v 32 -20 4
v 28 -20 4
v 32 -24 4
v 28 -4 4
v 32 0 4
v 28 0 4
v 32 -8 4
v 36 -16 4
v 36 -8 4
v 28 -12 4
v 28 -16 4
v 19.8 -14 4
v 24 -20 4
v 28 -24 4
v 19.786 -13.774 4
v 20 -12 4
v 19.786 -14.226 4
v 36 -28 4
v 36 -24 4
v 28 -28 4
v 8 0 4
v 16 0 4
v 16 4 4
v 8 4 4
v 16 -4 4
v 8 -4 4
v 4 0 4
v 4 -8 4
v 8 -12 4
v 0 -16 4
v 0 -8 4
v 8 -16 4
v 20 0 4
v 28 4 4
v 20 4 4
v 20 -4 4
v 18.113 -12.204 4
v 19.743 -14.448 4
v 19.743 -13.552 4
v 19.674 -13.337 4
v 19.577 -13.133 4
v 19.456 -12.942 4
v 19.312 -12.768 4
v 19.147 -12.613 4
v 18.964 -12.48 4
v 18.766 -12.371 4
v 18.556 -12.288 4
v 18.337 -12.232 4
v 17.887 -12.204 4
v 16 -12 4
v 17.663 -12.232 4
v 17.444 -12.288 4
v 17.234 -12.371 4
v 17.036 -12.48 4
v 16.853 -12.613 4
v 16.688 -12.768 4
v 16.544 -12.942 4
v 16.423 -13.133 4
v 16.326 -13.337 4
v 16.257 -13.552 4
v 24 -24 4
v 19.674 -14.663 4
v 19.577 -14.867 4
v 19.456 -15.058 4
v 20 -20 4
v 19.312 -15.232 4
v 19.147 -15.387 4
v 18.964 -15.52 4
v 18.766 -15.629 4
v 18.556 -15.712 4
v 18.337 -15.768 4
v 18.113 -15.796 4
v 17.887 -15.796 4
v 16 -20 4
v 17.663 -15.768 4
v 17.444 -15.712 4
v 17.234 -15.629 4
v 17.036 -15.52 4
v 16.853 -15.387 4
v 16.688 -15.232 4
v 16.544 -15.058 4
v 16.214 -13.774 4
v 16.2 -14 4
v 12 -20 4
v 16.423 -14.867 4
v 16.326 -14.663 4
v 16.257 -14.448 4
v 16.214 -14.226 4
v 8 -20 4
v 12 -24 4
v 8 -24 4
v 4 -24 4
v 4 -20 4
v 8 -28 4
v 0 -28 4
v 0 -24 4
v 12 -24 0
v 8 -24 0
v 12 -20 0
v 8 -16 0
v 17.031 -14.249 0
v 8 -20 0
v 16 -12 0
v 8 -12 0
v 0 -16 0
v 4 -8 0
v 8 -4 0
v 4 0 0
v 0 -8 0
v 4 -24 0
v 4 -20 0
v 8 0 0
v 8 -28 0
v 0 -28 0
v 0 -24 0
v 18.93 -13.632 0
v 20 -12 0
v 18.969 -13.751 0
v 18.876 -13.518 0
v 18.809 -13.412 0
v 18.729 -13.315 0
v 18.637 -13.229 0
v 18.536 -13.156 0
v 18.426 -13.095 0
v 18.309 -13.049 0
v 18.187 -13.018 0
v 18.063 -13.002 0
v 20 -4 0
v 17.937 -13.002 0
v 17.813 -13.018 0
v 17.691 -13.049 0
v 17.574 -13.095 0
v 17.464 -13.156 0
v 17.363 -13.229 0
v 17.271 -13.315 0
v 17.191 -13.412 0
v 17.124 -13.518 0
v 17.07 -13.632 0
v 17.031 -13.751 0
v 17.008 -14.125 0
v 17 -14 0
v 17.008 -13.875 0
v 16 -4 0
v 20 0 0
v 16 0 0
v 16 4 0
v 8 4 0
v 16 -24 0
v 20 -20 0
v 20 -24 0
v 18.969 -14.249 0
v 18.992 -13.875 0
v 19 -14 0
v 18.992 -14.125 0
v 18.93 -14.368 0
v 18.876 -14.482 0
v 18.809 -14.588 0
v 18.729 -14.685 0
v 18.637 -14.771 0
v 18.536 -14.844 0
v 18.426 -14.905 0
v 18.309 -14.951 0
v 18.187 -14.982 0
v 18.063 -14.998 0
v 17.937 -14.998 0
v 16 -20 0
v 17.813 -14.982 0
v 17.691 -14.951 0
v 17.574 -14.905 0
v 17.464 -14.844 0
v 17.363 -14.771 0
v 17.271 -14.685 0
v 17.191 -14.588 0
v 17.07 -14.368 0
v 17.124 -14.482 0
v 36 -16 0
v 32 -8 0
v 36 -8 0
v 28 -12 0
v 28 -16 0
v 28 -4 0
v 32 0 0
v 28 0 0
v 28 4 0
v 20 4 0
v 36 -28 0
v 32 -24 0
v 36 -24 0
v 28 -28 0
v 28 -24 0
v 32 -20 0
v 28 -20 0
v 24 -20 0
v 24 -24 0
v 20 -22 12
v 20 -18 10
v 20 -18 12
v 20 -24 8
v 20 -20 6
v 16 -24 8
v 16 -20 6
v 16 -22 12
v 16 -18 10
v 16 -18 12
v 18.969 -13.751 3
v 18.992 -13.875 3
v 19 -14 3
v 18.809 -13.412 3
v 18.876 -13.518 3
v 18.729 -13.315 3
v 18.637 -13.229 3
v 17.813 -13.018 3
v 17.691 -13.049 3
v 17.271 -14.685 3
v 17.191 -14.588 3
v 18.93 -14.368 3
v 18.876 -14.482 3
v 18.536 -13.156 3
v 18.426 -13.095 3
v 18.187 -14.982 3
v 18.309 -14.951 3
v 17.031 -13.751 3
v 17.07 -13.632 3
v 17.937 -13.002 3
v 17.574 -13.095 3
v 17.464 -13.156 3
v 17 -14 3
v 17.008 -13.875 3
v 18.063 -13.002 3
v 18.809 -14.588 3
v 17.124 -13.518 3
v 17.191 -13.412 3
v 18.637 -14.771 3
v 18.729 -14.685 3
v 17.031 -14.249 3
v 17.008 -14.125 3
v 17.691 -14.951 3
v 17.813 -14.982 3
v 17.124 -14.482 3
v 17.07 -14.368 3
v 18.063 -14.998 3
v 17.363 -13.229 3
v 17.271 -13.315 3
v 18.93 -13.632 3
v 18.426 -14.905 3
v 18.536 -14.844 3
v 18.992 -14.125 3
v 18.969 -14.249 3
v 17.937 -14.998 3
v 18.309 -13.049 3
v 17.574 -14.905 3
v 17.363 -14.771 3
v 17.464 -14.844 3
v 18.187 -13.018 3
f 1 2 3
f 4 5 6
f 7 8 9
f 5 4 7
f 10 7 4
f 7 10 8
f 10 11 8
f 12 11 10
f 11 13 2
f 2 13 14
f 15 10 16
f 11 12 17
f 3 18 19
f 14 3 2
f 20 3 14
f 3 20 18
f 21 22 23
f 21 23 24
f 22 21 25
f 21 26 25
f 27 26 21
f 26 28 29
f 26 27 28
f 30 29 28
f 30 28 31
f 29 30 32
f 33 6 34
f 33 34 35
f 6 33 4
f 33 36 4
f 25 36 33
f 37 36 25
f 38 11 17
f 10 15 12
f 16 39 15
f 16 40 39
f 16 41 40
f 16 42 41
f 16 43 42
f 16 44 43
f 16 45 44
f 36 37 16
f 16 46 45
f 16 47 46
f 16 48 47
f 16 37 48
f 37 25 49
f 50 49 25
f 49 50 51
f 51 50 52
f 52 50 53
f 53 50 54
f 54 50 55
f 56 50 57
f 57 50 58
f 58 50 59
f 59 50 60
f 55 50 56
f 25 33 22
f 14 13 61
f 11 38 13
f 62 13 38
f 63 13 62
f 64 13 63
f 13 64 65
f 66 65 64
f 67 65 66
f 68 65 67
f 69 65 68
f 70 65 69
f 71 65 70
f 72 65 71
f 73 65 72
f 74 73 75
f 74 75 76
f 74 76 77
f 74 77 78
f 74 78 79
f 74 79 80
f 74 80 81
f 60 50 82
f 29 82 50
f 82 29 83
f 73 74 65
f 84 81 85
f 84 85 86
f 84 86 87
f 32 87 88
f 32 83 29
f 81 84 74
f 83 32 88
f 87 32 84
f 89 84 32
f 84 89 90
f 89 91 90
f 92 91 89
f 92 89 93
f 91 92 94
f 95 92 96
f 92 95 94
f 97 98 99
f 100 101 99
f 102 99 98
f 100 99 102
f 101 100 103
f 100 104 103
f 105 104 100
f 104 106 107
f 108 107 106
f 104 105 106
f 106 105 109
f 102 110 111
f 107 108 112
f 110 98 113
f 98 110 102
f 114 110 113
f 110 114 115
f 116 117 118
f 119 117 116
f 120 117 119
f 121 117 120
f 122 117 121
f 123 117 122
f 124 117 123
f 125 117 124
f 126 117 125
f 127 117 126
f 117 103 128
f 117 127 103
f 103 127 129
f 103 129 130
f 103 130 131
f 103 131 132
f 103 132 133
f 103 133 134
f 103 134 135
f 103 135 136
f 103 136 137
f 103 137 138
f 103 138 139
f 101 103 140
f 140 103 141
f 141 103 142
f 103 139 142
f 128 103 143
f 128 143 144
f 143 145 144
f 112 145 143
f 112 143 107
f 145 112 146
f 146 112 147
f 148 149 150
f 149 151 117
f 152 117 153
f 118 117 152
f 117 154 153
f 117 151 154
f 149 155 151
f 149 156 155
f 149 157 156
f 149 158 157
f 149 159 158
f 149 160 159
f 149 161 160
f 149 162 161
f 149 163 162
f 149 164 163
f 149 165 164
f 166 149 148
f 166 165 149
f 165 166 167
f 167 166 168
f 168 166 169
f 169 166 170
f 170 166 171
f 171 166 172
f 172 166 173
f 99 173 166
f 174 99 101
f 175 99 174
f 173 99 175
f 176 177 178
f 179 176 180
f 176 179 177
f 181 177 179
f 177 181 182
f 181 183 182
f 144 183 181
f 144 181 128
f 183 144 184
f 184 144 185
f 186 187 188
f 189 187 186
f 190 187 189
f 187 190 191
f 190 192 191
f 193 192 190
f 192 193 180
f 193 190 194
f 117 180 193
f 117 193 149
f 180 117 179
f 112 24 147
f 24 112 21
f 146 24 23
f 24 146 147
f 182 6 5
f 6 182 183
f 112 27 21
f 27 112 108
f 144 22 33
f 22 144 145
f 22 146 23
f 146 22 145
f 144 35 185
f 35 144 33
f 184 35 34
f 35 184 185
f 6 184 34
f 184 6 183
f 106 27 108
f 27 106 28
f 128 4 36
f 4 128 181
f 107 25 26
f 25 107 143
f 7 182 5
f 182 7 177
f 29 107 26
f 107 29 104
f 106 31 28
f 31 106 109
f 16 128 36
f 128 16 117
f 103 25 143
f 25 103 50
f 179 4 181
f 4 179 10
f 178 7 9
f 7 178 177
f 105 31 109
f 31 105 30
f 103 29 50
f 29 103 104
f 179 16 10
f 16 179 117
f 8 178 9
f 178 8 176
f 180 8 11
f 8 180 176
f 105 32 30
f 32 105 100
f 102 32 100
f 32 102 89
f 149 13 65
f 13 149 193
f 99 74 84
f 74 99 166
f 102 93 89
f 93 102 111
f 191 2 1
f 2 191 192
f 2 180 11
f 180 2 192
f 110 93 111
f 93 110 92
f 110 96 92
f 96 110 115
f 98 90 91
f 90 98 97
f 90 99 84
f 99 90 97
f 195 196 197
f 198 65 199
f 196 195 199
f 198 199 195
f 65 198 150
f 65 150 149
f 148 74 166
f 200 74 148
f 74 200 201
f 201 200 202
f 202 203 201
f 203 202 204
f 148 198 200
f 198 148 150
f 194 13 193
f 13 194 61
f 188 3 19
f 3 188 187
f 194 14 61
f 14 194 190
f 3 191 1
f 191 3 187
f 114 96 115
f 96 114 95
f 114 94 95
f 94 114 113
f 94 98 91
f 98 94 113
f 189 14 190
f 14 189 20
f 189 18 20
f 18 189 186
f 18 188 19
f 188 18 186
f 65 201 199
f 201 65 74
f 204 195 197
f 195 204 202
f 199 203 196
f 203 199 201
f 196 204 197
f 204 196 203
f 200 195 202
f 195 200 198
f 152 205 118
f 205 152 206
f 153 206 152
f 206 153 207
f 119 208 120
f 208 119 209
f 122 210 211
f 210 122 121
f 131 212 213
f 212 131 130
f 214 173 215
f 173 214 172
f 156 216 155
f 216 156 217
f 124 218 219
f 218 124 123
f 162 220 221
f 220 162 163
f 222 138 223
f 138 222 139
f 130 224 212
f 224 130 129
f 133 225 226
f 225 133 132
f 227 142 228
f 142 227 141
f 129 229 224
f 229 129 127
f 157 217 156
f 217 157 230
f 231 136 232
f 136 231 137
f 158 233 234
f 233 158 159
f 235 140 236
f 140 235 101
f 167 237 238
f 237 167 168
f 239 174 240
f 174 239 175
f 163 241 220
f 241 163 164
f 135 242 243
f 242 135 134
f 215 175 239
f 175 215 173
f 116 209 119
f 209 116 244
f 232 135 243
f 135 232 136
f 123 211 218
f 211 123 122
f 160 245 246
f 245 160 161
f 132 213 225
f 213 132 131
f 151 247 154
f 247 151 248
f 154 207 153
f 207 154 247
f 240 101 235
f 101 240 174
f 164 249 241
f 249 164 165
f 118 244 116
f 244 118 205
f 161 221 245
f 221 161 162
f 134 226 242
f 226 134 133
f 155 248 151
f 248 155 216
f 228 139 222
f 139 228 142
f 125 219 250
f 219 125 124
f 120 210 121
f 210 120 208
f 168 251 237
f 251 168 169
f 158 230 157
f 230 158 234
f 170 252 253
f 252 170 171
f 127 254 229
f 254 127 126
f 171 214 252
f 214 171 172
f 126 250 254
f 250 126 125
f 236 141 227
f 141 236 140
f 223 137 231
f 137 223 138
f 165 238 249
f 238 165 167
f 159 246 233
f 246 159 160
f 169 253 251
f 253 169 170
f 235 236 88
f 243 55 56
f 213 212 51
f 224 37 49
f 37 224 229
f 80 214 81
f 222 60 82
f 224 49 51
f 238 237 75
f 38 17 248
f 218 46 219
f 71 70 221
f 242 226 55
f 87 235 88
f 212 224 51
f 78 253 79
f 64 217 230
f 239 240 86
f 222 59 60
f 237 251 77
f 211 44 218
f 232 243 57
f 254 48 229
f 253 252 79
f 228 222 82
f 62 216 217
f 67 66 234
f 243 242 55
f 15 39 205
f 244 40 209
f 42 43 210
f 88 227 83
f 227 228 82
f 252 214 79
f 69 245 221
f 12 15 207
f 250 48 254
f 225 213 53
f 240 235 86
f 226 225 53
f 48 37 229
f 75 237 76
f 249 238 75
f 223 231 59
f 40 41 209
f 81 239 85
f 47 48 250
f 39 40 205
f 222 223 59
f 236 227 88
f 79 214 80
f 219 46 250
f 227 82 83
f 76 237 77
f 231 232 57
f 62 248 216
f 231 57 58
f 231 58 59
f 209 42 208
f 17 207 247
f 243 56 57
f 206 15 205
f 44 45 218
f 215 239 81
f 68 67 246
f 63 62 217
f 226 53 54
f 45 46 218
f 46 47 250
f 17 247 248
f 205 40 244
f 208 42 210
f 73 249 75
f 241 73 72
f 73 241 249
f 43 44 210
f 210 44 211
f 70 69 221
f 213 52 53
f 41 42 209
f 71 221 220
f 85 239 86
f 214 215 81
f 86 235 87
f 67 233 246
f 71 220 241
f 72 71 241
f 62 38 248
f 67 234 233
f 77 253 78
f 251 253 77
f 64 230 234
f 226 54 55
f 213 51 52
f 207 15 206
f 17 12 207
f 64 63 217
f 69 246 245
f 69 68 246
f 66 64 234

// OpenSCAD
/* ********************************************************************
 * Space Invader Hooks
 * 
 * Generate your own cloth hooks. Tweak parameters, create your own
 * hooks or use the predefined modules.
 *
 * ******************************************************************** */

// preview[view:south, tilt:top]

// ------------------------------------------------------------------
// --- parameter ----------------------------------------------------
// ------------------------------------------------------------------

/* [Global] */



/* [Basic] */

// choose a space invader
spaceInvader = 5; // [1,2,3,4,5,6,7,8,9,10]

// pixel size
edgeLength = 4;

// thickness of the hook
strength = 4;

// radius of the hole
holeRadius = 1.0;

// adjust the strength of the connections of otherwise unconnected pixel
pixel_connection_strength = 0.4;


/* [Advanced] */

// resolution
$fn=50;

// make a hole or not
make_hole = "yes"; // [yes,no]

// make a hook or just the base space invader
make_hook = "yes"; // [yes,no]

// use to avoid loonely pixel
// minkowski_factor=10;



/* [Hidden] */

// ------------------------------------------------------------------
// --- space invader versions ---------------------------------------
// --- a vector of 2d coordinates; hole and hook position -----------
// ------------------------------------------------------------------

// space invader 1 parameter
si_1=[[0,0,1,0,1,0,0],[0,1,1,1,1,1,0],[0,1,0,1,0,1,0],[1,1,1,1,1,1,1],[1,0,1,0,1,0,1],[1,0,0,0,0,0,1]];
si_1_hole=[3,2];
si_1_hook=[3,4];

// space invader 2 parameter
si_2=[[0,0,1,0,1,0,0],[0,1,1,1,1,1,0],[0,1,0,1,0,1,0],[1,1,1,1,1,1,1],[1,0,1,1,1,0,1],[1,0,0,1,0,0,1]];
si_2_hole=[3,3];
si_2_hook=[3,5];

// space invader 3 parameter
si_3=[[0,0,1,0,1,0,0],[0,1,1,1,1,1,0],[0,1,0,1,0,1,0],[1,1,1,1,1,1,1],[1,0,1,1,1,0,1],[1,0,0,1,0,0,1],[0,0,0,1,0,0,0]];
si_3_hole=[3,3];
si_3_hook=[3,6];

// space invader 5 parameter
si_4=[[0,0,1,0,1,0,0],[0,1,1,1,1,1,0],[0,1,0,1,0,1,0],[1,1,1,1,1,1,1],[1,0,1,1,1,0,1],[1,0,0,1,0,0,1],[1,1,0,1,0,1,1]];
si_4_hole=[3,3];
si_4_hook=[3,6];

// space invader 5 parameter
si_5=[[0,0,1,1,0,1,1,0,0],[0,1,1,1,1,1,1,1,0],[0,1,0,0,1,0,0,1,0],[1,1,0,0,1,0,0,1,1],[1,1,1,1,1,1,1,1,1],[0,0,1,1,1,1,1,0,0],[0,1,1,0,1,0,1,1,0],[1,1,0,0,0,0,0,1,1]];
si_5_hole=[4,4];
si_5_hook=[4,6];

// space invader 6 parameter
si_6=[[0,0,1,0,0,0,0,0,1,0,0],[0,0,0,1,0,0,0,1,0,0,0],[0,0,1,1,1,1,1,1,1,0,0],[0,1,1,0,1,1,1,0,1,1,0],[1,1,1,1,1,1,1,1,1,1,1],[1,0,1,1,1,1,1,1,1,0,1],[1,0,1,0,0,0,0,0,1,0,1],[0,0,0,1,1,0,1,1,0,0,0]];
si_6_hole=[5,3];
si_6_hook=[5,5];
si_6_cons=[[0,0,2,0,0,0,0,0,0,0,0],[0,0,0,0,0,0,0,1,0,0,0],[0,0,0,0,0,0,0,0,0,0,0],[0,0,0,0,0,0,0,0,0,0,0],[0,0,0,0,0,0,0,0,0,0,0],[0,0,0,0,0,0,0,0,0,0,0],[0,0,2,0,0,0,0,0,0,0,0],[0,0,0,0,0,0,0,1,0,0,0]];

// space invader 7 parameter
si_7=[[0,0,0,1,1,0,0,0],[0,0,1,1,1,1,0,0],[0,1,1,1,1,1,1,0],[1,1,0,1,1,0,1,1],[1,1,1,1,1,1,1,1],[0,1,0,1,1,0,1,0],[1,0,0,0,0,0,0,1],[0,1,0,0,0,0,1,0]];
si_7_hole=[3.5,3];
si_7_hook=[3.5,5];
si_7_cons=[[0,0,0,0,0,0,0,0],[0,0,0,0,0,0,0,0],[0,0,0,0,0,0,0,0],[0,0,0,0,0,0,0,0],[0,0,0,0,0,0,0,0],[0,0,0,0,0,0,2,0],[3,0,0,0,0,0,0,0],[0,0,0,0,0,0,1,0]];

// space invader 8 parameter
si_8=[[0,0,0,1,1,0,0,0],[0,0,1,1,1,1,0,0],[0,1,1,1,1,1,1,0],[1,1,0,1,1,0,1,1],[1,1,1,1,1,1,1,1],[0,1,0,1,1,0,1,0],[1,0,1,0,0,1,0,1],[0,1,0,1,1,0,1,0]];
si_8_hole=[3.5,3];
si_8_hook=[3.5,5];
si_8_cons=[[0,0,0,0,0,0,0,0],[0,0,0,0,0,0,0,0],[0,0,0,0,0,0,0,0],[0,0,0,0,0,0,0,0],[0,0,0,0,0,0,0,0],[0,2,0,0,2,0,2,0],[3,0,3,0,0,3,0,0],[0,1,0,0,1,0,1,0]];

// space invader 9 parameter
si_9=[[0,0,0,0,1,1,1,1,0,0,0,0],[0,1,1,1,1,1,1,1,1,1,1,0],[1,1,1,1,1,1,1,1,1,1,1,1],[1,1,1,0,0,1,1,0,0,1,1,1],[1,1,1,1,1,1,1,1,1,1,1,1],[0,0,1,1,1,0,0,1,1,1,0,0],[0,1,1,0,0,1,1,0,0,1,1,0],[0,0,1,1,0,0,0,0,1,1,0,0]];
si_9_hole=[5.5,2];
si_9_hook=[5.5,4];
si_9_cons=[[0,0,0,0,0,0,0,0,0,0,0,0],[0,0,0,0,0,0,0,0,0,0,0,0],[0,0,0,0,0,0,0,0,0,0,0,0],[0,0,0,0,0,0,0,0,0,0,0,0],[0,0,0,0,0,0,0,0,0,0,0,0],[0,0,0,0,2,0,0,0,0,0,0,0],[0,0,0,0,0,0,1,0,0,0,0,0],[0,0,0,0,0,0,0,0,0,0,0,0]];

si_10=[[0,0,0,0,0,1,1,1,1,1,1,0,0,0,0,0],[0,0,0,1,1,1,1,1,1,1,1,1,1,0,0,0],[0,0,1,1,1,1,1,1,1,1,1,1,1,1,0,0],[0,1,1,0,1,1,0,1,1,0,1,1,0,1,1,0],[1,1,1,1,1,1,1,1,1,1,1,1,1,1,1,1],[0,0,1,1,1,0,0,1,1,0,0,1,1,1,0,0],[0,0,0,1,0,0,0,0,0,0,0,0,1,0,0,0]];
si_10_hole=[7.5,3];
si_10_hook=[7.5,5];
si_10_cons=[];




// ------------------------------------------------------------------
// --- programm -----------------------------------------------------
// ------------------------------------------------------------------

if (spaceInvader == 1) {
	complete_hook(si_1, [], si_1_hole, si_1_hook);
} else if (spaceInvader == 2) {
	complete_hook(si_2, [], si_2_hole, si_2_hook);
} else if (spaceInvader == 3) {
	complete_hook(si_3, [], si_3_hole, si_3_hook);
} else if (spaceInvader == 4) {
	complete_hook(si_4, [], si_4_hole, si_4_hook);
} else if (spaceInvader == 5) {
	complete_hook(si_5, [], si_5_hole, si_5_hook);
} else if (spaceInvader == 6) {
	complete_hook(si_6, si_6_cons, si_6_hole, si_6_hook);
} else if (spaceInvader == 7) {
	complete_hook(si_7, si_7_cons, si_7_hole, si_7_hook);
} else if (spaceInvader == 8) {
	complete_hook(si_8, si_8_cons, si_8_hole, si_8_hook);
} else if (spaceInvader == 9) {
	complete_hook(si_9, si_9_cons, si_9_hole, si_9_hook);
} else if (spaceInvader == 10) {
	complete_hook(si_10, si_10_cons, si_10_hole, si_10_hook);
}




// ------------------------------------------------------------------
// --- modules ------------------------------------------------------
// ------------------------------------------------------------------



module complete_hook(matrix, cons, hole, hook) {
	difference() {
		union() {
			hook_base(matrix);
			connections(cons);
			if (make_hook == "yes") {
				hook(hook[0], hook[1]);
			}
		}
		if (make_hole == "yes") {
			hook_hole_positive(hole[0], hole[1], 1);
		}
	}
}


module hook_base(data) {
	for (y = [0:len(data)]) {
		for(x = [0:len(data[y])]) {
			pixel(x,y,data[y][x]);
		}
	}
}

module connections(data) {
	for (y = [0:len(data)]) {
		for(x = [0:len(data[y])]) {
			if (data[y][x] > 0) {
				pixel_connection(x,y,data[y][x]);
			}
		}
	}
}

// builds a cube at specified position
//
module pixel(x, y, h) {
	translate([x*edgeLength, -y*edgeLength, 0]) {
		if (h > 0) {
			cube([edgeLength, edgeLength, strength*h]);
			/*
			minkowski()
			{
				cube([edgeLength, edgeLength, strength*h-(strength/5)]);
 				cylinder(r=strength/10,h=strength*h-(strength/5));
			}
			*/
		}
	}
}

// build a connection
module pixel_connection(x,y,direction) {
	translate([(x+0.5)*edgeLength,-(y-0.5)*edgeLength,0]) {
		if (direction == 3) {
			union() {
				hull() {
					cylinder(r=pixel_connection_strength, h=strength);
					translate([edgeLength,edgeLength,0]) {
						cylinder(r=pixel_connection_strength, h=strength);
					}
				}
				hull() {
					cylinder(r=pixel_connection_strength, h=strength);
					translate([edgeLength,-edgeLength,0]) {
						cylinder(r=pixel_connection_strength, h=strength);
					}
				}
			}
		}
		hull() {
			cylinder(r=pixel_connection_strength, h=strength);
			if (direction == 1) {
				translate([edgeLength,edgeLength,0]) {
					cylinder(r=pixel_connection_strength, h=strength);
				}
			}
			if (direction == 2) {
				translate([edgeLength,-edgeLength,0]) {
					cylinder(r=pixel_connection_strength, h=strength);
				}
			}
		}
	}
}

// make the positives for the holes
//
module hook_hole_positive(x,y,h) {
	translate([x*edgeLength+edgeLength/2, -y*edgeLength+edgeLength/2, 0]) {
		cylinder(h=strength*h, r=holeRadius);
		hull() {
			translate([0, 0, strength*h-holeRadius]) cylinder(h=0.1, r=holeRadius);
			translate([0, 0, strength*h]) cylinder(h=holeRadius/2, r=holeRadius*1.8);
		}
	}
}

// builds the hook at specified position
//
module hook(x, y) {
	translate([x*edgeLength, -y*edgeLength, 0]) {
		union() {
			cube([edgeLength, edgeLength, 0.5*edgeLength+strength]);
			hull() {
				translate([0, 0, 0.5*edgeLength+strength]) {
					cube([edgeLength, edgeLength, 0.5*edgeLength]);
				}
				translate([0, 0.5*edgeLength, 0.5*edgeLength+2*strength]) {
					cube([edgeLength, edgeLength, 0.5*edgeLength]);
				}
			}
		}
	}
}
